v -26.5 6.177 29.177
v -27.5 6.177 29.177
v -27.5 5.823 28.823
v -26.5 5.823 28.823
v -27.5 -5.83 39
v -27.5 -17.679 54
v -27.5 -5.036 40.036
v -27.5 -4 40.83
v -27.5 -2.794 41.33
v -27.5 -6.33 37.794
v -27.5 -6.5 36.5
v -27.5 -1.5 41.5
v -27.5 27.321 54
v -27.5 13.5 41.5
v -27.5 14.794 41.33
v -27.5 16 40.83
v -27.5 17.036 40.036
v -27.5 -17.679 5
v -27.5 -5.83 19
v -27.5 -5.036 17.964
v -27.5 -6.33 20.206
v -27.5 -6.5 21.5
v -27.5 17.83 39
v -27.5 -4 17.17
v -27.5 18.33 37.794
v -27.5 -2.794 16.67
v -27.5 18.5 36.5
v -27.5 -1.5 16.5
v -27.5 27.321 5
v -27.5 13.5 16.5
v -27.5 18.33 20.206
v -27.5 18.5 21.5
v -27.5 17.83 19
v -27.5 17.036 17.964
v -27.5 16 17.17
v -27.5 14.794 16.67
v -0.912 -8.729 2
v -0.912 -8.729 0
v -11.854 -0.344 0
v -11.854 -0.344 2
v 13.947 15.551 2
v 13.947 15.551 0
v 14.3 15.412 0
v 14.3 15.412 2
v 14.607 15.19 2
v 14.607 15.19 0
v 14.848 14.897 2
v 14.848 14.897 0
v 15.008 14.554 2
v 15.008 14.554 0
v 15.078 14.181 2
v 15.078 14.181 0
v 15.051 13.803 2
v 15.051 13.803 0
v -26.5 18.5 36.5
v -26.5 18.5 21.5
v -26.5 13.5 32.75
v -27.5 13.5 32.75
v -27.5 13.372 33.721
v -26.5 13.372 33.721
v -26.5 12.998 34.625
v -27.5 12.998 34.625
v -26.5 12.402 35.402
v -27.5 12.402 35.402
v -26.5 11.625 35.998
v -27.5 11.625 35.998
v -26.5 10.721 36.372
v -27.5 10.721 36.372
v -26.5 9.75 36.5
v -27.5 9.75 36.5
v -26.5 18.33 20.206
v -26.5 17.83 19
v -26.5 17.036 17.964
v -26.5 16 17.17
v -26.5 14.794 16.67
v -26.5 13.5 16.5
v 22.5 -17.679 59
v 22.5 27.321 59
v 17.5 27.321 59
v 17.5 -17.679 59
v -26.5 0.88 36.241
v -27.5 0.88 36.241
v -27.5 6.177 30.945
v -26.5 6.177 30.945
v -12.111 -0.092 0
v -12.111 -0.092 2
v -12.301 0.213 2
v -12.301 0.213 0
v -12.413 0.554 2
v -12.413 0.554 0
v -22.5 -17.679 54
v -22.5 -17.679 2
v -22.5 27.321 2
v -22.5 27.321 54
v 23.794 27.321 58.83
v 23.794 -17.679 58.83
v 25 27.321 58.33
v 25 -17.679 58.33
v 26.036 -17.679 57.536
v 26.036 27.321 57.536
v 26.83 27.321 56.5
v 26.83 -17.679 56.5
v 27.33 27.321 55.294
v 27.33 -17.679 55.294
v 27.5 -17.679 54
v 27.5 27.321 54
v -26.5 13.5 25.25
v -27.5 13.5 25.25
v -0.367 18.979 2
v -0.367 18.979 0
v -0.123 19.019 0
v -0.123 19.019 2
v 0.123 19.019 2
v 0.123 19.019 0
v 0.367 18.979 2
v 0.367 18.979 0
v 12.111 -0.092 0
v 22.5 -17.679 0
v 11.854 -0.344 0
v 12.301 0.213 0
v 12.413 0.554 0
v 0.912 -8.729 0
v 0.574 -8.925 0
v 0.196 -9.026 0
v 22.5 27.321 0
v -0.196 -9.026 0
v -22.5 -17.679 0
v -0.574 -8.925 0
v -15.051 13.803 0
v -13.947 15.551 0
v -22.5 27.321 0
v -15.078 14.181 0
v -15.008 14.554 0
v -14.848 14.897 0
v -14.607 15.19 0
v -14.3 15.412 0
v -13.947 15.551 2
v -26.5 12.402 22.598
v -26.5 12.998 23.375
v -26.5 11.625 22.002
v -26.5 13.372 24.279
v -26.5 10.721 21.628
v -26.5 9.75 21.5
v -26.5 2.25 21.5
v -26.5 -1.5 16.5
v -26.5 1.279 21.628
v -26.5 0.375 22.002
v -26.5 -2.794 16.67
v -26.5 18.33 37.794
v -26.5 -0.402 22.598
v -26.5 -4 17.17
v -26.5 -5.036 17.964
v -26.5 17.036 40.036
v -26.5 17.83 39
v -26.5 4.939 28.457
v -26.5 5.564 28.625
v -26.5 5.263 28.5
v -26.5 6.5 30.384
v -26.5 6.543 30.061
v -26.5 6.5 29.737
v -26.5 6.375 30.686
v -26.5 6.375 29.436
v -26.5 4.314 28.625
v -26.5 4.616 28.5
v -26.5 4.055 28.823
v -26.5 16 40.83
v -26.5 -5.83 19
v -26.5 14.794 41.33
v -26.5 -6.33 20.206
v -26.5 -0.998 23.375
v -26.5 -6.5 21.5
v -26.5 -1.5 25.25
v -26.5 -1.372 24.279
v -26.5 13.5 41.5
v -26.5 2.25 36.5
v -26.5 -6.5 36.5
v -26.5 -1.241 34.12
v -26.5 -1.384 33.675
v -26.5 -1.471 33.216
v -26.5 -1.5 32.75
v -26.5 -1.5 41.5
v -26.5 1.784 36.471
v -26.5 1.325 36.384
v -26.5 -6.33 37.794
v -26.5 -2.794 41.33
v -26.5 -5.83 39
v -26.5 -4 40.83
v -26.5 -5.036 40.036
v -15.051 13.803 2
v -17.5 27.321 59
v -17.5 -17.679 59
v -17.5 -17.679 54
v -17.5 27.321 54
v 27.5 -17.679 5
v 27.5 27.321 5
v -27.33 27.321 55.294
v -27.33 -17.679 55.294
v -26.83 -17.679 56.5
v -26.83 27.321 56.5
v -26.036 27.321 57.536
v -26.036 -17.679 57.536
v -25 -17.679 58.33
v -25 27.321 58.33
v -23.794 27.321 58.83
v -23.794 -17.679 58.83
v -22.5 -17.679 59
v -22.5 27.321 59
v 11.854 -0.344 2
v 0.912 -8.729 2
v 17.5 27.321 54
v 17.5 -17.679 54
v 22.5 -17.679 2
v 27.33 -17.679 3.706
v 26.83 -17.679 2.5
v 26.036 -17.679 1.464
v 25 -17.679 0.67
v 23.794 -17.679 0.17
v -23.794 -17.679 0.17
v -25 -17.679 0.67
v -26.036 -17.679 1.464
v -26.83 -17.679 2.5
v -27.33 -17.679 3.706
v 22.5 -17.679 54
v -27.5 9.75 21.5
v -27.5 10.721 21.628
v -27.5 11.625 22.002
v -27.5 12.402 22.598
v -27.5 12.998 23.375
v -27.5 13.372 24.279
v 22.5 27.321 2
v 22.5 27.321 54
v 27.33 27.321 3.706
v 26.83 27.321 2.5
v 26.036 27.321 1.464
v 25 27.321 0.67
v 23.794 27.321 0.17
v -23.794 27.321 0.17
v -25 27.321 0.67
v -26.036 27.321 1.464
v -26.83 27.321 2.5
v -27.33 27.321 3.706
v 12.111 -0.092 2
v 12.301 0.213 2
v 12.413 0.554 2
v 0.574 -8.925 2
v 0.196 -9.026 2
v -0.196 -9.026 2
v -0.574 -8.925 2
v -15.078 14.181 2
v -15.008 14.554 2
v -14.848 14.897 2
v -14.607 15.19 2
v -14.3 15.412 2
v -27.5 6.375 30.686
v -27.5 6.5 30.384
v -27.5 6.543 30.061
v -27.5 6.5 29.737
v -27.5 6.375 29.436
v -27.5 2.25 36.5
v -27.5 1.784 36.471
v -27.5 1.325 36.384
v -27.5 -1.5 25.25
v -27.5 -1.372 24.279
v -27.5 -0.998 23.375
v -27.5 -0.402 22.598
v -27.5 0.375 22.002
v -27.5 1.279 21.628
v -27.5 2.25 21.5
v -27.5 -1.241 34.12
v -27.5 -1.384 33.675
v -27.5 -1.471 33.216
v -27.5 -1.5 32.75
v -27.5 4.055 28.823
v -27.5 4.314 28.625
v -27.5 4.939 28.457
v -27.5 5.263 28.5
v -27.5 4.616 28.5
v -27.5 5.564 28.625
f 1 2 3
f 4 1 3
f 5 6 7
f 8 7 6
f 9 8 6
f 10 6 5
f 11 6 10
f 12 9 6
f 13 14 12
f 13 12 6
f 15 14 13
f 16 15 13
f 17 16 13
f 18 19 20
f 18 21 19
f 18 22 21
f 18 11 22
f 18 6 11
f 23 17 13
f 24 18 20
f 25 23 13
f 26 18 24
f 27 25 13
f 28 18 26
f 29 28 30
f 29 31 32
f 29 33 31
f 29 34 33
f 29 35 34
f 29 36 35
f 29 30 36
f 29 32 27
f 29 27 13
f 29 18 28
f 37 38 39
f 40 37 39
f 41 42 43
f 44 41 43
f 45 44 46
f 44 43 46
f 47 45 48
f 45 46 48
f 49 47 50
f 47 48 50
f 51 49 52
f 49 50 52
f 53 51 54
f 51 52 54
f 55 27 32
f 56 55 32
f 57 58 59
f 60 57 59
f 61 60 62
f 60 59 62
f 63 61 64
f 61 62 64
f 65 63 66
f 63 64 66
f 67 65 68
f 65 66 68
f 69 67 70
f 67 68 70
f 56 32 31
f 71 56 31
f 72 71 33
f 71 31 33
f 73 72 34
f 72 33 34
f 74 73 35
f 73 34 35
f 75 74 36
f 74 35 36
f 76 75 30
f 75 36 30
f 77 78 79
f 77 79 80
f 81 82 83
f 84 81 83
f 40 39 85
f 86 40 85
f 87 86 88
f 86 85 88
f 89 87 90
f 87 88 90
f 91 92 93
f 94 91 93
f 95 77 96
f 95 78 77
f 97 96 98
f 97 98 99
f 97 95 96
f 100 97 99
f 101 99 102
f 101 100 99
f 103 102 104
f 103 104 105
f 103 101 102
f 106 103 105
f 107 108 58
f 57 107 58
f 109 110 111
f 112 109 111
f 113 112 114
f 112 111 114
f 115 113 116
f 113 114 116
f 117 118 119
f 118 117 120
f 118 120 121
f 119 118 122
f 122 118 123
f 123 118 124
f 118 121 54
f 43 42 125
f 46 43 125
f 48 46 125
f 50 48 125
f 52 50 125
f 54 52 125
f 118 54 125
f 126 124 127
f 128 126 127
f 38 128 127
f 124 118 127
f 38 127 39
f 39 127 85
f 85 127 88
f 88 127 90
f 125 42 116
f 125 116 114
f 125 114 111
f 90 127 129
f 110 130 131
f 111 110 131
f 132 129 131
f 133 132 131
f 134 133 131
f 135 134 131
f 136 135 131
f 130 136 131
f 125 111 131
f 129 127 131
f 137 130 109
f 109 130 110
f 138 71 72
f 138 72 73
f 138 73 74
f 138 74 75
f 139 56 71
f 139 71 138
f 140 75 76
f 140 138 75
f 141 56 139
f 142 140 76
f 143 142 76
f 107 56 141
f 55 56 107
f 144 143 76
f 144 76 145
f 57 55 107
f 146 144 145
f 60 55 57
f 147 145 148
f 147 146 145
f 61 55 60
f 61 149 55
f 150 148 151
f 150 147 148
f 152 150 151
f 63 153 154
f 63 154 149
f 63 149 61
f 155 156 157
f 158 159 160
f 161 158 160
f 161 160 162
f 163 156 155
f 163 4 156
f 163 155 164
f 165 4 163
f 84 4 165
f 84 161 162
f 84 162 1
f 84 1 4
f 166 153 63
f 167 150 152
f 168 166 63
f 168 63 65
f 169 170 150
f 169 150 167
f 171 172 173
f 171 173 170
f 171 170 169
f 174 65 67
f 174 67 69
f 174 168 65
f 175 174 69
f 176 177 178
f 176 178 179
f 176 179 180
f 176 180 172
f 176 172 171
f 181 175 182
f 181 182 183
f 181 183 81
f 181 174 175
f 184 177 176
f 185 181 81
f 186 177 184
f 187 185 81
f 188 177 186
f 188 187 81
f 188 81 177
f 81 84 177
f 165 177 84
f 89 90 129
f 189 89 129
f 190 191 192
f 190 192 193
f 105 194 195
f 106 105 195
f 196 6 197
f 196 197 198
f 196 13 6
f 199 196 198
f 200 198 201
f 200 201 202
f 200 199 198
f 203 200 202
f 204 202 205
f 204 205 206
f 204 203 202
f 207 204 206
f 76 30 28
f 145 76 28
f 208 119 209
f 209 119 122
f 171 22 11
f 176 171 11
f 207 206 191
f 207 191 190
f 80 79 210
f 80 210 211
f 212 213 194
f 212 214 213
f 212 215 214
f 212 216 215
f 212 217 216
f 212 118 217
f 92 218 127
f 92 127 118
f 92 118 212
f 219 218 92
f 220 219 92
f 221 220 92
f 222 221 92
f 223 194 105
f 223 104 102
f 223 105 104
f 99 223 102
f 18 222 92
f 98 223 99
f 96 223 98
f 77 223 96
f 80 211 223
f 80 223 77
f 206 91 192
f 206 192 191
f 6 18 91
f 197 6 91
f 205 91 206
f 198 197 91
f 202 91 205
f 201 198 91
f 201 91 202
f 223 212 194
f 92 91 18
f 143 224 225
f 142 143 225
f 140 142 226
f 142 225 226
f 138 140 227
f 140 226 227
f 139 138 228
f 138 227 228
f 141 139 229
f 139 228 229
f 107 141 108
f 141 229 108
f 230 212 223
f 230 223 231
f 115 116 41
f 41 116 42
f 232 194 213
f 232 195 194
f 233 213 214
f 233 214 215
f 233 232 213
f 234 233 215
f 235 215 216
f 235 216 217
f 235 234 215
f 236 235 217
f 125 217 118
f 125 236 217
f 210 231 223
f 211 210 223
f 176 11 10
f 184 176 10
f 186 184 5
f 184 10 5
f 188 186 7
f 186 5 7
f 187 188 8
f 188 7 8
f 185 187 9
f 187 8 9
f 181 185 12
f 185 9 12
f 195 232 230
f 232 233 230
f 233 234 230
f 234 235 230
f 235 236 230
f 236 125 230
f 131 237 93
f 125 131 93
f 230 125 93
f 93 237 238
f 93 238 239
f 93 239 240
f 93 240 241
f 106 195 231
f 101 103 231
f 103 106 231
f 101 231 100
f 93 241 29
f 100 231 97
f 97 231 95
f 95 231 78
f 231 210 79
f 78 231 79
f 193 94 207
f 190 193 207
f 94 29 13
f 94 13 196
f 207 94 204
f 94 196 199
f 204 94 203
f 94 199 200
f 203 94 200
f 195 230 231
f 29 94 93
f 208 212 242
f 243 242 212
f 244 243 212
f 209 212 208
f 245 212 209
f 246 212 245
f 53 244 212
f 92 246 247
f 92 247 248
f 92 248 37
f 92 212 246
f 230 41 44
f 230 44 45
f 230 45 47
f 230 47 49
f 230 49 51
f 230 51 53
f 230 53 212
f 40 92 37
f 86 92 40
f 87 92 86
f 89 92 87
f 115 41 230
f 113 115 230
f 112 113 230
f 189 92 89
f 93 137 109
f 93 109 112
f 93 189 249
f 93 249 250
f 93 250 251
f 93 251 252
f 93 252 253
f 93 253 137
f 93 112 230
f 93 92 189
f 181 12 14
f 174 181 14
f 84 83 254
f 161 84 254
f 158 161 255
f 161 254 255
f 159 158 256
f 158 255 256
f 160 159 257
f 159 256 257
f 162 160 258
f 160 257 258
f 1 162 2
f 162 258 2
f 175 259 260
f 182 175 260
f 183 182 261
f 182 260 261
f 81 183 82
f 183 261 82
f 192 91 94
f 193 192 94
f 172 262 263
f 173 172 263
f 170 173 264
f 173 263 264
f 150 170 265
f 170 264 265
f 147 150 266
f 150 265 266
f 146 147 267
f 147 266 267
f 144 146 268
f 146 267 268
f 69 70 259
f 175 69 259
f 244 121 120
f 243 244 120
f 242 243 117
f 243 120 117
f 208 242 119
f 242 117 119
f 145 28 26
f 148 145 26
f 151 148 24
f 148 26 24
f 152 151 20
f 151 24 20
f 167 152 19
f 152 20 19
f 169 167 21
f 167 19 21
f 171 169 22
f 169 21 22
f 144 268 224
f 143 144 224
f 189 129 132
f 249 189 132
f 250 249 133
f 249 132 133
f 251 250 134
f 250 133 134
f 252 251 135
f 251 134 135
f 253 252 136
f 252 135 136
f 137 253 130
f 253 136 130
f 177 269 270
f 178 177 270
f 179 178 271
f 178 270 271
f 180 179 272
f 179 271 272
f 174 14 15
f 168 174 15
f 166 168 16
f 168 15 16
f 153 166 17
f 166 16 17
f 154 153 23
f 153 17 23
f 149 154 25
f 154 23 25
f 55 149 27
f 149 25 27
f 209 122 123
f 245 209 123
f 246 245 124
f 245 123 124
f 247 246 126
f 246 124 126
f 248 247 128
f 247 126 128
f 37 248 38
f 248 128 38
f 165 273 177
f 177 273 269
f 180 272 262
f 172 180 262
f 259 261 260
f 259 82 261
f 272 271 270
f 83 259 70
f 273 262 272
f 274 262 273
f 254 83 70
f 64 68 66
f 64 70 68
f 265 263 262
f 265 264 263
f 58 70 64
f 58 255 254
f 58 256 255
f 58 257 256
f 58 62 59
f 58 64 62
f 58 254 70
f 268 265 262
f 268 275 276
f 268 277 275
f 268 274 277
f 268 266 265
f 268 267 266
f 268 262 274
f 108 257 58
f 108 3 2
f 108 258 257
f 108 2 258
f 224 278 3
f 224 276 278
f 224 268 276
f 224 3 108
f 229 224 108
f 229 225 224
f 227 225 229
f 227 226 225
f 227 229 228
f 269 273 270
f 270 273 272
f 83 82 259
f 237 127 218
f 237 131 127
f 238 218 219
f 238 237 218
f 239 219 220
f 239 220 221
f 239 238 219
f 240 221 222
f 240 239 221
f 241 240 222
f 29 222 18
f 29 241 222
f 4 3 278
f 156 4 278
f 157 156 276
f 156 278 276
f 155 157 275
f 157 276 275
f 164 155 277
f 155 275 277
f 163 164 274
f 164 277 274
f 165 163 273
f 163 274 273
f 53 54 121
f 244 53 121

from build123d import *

# Parameters (mm, degrees)
F0_W      = 45
F0_H      = 45
F1_DEPTH  = 2
F2_DEPTH  = 5
F3_DEPTH  = 5
F4_W      = 5
F4_H      = 45
F5_DEPTH  = 57
F7_W      = 45
F7_H      = 5
F8_DEPTH  = 5
F6_W      = 45
F6_H      = 5
F9_DEPTH  = 5
F10_R     = 5
F12_DEPTH = 1


with BuildPart() as f1:
    # F0 (on Top) → F1 (new body)
    with BuildSketch(Plane.XY):
        with Locations((0, 4.82134892)):
            Rectangle(F0_W, F0_H)
        with BuildLine():
            ThreePointArc((-15.0511533834, 13.8031822317), (-14.8481410429, 14.8973282595), (-13.9471820002, 15.5505069059))
            Line((-13.9471820002, 15.5505069059), (-0.3671439173, 18.9786667044))
            ThreePointArc((-0.3671439173, 18.9786667044), (0, 19.0242921501), (0.3671439173, 18.9786667044))
            Line((0.3671439173, 18.9786667044), (13.9471820002, 15.5505069059))
            ThreePointArc((13.9471820002, 15.5505069059), (14.8481410429, 14.8973282595), (15.0511533834, 13.8031822317))
            Line((15.0511533834, 13.8031822317), (12.4127807629, 0.5539972479))
            ThreePointArc((12.4127807629, 0.5539972479), (12.2151536655, 0.0543391438), (11.854115567, -0.3436133433))
            Line((11.854115567, -0.3436133433), (0.9124501045, -8.7293459665))
            ThreePointArc((0.9124501045, -8.7293459665), (0, -9.0387852554), (-0.9124501045, -8.7293459665))
            Line((-0.9124501045, -8.7293459665), (-11.854115567, -0.3436133433))
            ThreePointArc((-11.854115567, -0.3436133433), (-12.2151536655, 0.0543391438), (-12.4127807629, 0.5539972479))
            Line((-12.4127807629, 0.5539972479), (-15.0511533834, 13.8031822317))
        make_face(mode=Mode.SUBTRACT)
    extrude(amount=F1_DEPTH)

    # F2 (add): a face of the model
    f2_faces = [f1.faces().sort_by_distance(p)[0] for p in [
        (-22.5, 4.82134892, 1),
    ]]
    extrude(f2_faces, amount=F2_DEPTH)

    # F3 (add): a face of the model
    f3_faces = [f1.faces().sort_by_distance(p)[0] for p in [
        (22.5, 4.82134892, 1),
    ]]
    extrude(f3_faces, amount=F3_DEPTH)

    # F4 (on face) → F5 (join)
    with BuildSketch(Plane.XY.offset(2)):
        with Locations((-25, 4.82134892)):
            Rectangle(F4_W, F4_H)
        with Locations((25, 4.82134892)):
            Rectangle(F4_W, F4_H)
    extrude(amount=F5_DEPTH)

    # F7 (on face) → F8 (join)
    with BuildSketch(Plane(origin=(22.5, 0, 0), x_dir=(0, -1, 0), z_dir=(-1, 0, 0))):
        with Locations((-4.82134892, 56.5)):
            Rectangle(F7_W, F7_H)
    extrude(amount=F8_DEPTH)

    # F6 (on face) → F9 (join)
    with BuildSketch(Plane.YZ.offset(-22.5)):
        with Locations((4.82134892, 56.5)):
            Rectangle(F6_W, F6_H)
    extrude(amount=F9_DEPTH)

    # F10
    f10_edges = [f1.edges().sort_by_distance(p)[0] for p in [
        (27.5, 4.821349, 0),
        (-27.5, 4.821349, 0),
        (-27.5, 4.821349, 59),
        (27.5, 4.821349, 59),
    ]]
    fillet(f10_edges, radius=F10_R)

    # F11 (on face) → F12 (cut)
    with BuildSketch(Plane(origin=(-27.5, 0, 0), x_dir=(0, -1, 0), z_dir=(-1, 0, 0))):
        with BuildLine():
            ThreePointArc((1.4999996684, 16.5000007302), (5.0355335744, 17.9644668242), (6.4999996684, 21.5000007302))
            Line((6.4999996684, 21.5000007302), (6.4999996684, 36.5000007302))
            ThreePointArc((6.4999996684, 36.5000007302), (5.0355335744, 40.0355346361), (1.4999996684, 41.5000007302))
            Line((1.4999996684, 41.5000007302), (-13.5000003316, 41.5000007302))
            ThreePointArc((-13.5000003316, 41.5000007302), (-17.0355342375, 40.0355346361), (-18.5000003316, 36.5000007302))
            Line((-18.5000003316, 36.5000007302), (-18.5000003316, 21.5000007302))
            ThreePointArc((-18.5000003316, 21.5000007302), (-17.0355342375, 17.9644668242), (-13.5000003316, 16.5000007302))
            Line((-13.5000003316, 16.5000007302), (1.4999996684, 16.5000007302))
        make_face()
        with BuildLine():
            Line((1.4999996684, 32.7500007302), (1.4999996684, 25.2500007302))
            ThreePointArc((1.4999996684, 25.2500007302), (0.4016500979, 22.5983503007), (-2.2500003316, 21.5000007302))
            Line((-2.2500003316, 21.5000007302), (-9.7500003316, 21.5000007302))
            ThreePointArc((-9.7500003316, 21.5000007302), (-12.401650761, 22.5983503007), (-13.5000003316, 25.2500007302))
            Line((-13.5000003316, 25.2500007302), (-13.5000003316, 32.7500007302))
            ThreePointArc((-13.5000003316, 32.7500007302), (-12.401650761, 35.4016511596), (-9.7500003316, 36.5000007302))
            Line((-9.7500003316, 36.5000007302), (-2.2500003316, 36.5000007302))
            ThreePointArc((-2.2500003316, 36.5000007302), (-1.5530488983, 36.4346660745), (-0.8803828421, 36.2409387033))
            Line((-0.8803828316, 36.2409387302), (-6.1767770816, 30.9445444802))
            ThreePointArc((-6.176777058, 30.9445444566), (-6.5428935816, 30.0606609802), (-6.176777058, 29.1767775037))
            Line((-6.1767770816, 29.1767774802), (-6.0000003316, 29.0000007302))
            Line((-6.0000003316, 29.0000007302), (-5.8232235816, 28.8232239802))
            ThreePointArc((-5.823223558, 28.8232240037), (-4.9393400816, 28.4571074802), (-4.0554566051, 28.8232240037))
            Line((-4.0554565816, 28.8232239802), (1.2409376684, 34.1196182302))
            ThreePointArc((1.2409376416, 34.1196182196), (1.4346650128, 33.4469521634), (1.4999996684, 32.7500007302))
        make_face(mode=Mode.SUBTRACT)
    extrude(amount=-F12_DEPTH, mode=Mode.SUBTRACT)


solid = f1.part
